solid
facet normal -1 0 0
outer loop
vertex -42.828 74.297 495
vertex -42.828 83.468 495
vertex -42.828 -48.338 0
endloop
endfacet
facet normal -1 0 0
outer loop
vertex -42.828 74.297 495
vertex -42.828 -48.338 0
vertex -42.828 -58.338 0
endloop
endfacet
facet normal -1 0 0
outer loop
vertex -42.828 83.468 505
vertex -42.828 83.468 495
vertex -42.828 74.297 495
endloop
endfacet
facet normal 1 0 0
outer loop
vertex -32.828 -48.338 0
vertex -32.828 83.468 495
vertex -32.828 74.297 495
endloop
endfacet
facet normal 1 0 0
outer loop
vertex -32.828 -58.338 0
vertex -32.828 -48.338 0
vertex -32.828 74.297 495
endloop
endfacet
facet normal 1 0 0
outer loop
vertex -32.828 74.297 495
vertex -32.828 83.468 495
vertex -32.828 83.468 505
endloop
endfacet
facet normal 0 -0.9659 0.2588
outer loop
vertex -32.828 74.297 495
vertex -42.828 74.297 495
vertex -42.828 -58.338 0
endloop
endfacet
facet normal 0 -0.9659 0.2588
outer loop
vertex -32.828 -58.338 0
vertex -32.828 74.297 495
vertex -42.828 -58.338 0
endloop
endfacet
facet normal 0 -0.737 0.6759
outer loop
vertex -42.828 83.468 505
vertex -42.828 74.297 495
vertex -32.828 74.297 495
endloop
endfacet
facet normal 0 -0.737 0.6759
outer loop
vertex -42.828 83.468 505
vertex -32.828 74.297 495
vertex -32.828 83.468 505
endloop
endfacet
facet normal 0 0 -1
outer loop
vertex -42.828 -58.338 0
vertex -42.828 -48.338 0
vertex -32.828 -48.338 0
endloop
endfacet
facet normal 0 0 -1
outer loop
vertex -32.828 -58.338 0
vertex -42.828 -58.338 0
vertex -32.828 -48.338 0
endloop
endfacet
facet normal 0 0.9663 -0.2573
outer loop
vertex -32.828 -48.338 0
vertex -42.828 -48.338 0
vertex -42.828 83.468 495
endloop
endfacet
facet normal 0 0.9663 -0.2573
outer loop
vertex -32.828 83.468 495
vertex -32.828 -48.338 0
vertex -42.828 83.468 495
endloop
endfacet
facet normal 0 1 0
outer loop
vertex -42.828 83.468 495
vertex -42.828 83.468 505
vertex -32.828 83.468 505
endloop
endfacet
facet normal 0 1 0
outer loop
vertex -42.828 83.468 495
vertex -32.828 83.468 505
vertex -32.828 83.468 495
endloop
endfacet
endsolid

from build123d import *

# Parameters (mm, degrees)
F0_W     = 10
F0_H     = 141.806
F1_DEPTH = 495
F3_DEPTH = 10
F5_DEPTH = 10


with BuildPart() as f1:
    # F0 (on Top) → F1 (new body)
    with BuildSketch(Plane.XY):
        with Locations((-37.828005, 12.564924)):
            Rectangle(F0_W, F0_H)
    extrude(amount=F1_DEPTH)

    # F2 (on face) → F3 (cut)
    with BuildSketch(Plane(origin=(-42.828005, 0, 0), x_dir=(0, -1, 0), z_dir=(-1, 0, 0))):
        Polygon((-83.467924, 0), (48.338076, 0), (-83.467924, 495), align=None)
        Polygon((-74.296774, 495), (58.338076, 0), (58.338076, 495), align=None)
    extrude(amount=-F3_DEPTH, mode=Mode.SUBTRACT)

    # F4 (on face) → F5 (join)
    with BuildSketch(Plane(origin=(-42.828005, 0, 0), x_dir=(0, -1, 0), z_dir=(-1, 0, 0))):
        Polygon((-83.467924, 505), (-83.467924, 495), (-74.296774, 495), align=None)
    extrude(amount=-F5_DEPTH)


solid = f1.part
